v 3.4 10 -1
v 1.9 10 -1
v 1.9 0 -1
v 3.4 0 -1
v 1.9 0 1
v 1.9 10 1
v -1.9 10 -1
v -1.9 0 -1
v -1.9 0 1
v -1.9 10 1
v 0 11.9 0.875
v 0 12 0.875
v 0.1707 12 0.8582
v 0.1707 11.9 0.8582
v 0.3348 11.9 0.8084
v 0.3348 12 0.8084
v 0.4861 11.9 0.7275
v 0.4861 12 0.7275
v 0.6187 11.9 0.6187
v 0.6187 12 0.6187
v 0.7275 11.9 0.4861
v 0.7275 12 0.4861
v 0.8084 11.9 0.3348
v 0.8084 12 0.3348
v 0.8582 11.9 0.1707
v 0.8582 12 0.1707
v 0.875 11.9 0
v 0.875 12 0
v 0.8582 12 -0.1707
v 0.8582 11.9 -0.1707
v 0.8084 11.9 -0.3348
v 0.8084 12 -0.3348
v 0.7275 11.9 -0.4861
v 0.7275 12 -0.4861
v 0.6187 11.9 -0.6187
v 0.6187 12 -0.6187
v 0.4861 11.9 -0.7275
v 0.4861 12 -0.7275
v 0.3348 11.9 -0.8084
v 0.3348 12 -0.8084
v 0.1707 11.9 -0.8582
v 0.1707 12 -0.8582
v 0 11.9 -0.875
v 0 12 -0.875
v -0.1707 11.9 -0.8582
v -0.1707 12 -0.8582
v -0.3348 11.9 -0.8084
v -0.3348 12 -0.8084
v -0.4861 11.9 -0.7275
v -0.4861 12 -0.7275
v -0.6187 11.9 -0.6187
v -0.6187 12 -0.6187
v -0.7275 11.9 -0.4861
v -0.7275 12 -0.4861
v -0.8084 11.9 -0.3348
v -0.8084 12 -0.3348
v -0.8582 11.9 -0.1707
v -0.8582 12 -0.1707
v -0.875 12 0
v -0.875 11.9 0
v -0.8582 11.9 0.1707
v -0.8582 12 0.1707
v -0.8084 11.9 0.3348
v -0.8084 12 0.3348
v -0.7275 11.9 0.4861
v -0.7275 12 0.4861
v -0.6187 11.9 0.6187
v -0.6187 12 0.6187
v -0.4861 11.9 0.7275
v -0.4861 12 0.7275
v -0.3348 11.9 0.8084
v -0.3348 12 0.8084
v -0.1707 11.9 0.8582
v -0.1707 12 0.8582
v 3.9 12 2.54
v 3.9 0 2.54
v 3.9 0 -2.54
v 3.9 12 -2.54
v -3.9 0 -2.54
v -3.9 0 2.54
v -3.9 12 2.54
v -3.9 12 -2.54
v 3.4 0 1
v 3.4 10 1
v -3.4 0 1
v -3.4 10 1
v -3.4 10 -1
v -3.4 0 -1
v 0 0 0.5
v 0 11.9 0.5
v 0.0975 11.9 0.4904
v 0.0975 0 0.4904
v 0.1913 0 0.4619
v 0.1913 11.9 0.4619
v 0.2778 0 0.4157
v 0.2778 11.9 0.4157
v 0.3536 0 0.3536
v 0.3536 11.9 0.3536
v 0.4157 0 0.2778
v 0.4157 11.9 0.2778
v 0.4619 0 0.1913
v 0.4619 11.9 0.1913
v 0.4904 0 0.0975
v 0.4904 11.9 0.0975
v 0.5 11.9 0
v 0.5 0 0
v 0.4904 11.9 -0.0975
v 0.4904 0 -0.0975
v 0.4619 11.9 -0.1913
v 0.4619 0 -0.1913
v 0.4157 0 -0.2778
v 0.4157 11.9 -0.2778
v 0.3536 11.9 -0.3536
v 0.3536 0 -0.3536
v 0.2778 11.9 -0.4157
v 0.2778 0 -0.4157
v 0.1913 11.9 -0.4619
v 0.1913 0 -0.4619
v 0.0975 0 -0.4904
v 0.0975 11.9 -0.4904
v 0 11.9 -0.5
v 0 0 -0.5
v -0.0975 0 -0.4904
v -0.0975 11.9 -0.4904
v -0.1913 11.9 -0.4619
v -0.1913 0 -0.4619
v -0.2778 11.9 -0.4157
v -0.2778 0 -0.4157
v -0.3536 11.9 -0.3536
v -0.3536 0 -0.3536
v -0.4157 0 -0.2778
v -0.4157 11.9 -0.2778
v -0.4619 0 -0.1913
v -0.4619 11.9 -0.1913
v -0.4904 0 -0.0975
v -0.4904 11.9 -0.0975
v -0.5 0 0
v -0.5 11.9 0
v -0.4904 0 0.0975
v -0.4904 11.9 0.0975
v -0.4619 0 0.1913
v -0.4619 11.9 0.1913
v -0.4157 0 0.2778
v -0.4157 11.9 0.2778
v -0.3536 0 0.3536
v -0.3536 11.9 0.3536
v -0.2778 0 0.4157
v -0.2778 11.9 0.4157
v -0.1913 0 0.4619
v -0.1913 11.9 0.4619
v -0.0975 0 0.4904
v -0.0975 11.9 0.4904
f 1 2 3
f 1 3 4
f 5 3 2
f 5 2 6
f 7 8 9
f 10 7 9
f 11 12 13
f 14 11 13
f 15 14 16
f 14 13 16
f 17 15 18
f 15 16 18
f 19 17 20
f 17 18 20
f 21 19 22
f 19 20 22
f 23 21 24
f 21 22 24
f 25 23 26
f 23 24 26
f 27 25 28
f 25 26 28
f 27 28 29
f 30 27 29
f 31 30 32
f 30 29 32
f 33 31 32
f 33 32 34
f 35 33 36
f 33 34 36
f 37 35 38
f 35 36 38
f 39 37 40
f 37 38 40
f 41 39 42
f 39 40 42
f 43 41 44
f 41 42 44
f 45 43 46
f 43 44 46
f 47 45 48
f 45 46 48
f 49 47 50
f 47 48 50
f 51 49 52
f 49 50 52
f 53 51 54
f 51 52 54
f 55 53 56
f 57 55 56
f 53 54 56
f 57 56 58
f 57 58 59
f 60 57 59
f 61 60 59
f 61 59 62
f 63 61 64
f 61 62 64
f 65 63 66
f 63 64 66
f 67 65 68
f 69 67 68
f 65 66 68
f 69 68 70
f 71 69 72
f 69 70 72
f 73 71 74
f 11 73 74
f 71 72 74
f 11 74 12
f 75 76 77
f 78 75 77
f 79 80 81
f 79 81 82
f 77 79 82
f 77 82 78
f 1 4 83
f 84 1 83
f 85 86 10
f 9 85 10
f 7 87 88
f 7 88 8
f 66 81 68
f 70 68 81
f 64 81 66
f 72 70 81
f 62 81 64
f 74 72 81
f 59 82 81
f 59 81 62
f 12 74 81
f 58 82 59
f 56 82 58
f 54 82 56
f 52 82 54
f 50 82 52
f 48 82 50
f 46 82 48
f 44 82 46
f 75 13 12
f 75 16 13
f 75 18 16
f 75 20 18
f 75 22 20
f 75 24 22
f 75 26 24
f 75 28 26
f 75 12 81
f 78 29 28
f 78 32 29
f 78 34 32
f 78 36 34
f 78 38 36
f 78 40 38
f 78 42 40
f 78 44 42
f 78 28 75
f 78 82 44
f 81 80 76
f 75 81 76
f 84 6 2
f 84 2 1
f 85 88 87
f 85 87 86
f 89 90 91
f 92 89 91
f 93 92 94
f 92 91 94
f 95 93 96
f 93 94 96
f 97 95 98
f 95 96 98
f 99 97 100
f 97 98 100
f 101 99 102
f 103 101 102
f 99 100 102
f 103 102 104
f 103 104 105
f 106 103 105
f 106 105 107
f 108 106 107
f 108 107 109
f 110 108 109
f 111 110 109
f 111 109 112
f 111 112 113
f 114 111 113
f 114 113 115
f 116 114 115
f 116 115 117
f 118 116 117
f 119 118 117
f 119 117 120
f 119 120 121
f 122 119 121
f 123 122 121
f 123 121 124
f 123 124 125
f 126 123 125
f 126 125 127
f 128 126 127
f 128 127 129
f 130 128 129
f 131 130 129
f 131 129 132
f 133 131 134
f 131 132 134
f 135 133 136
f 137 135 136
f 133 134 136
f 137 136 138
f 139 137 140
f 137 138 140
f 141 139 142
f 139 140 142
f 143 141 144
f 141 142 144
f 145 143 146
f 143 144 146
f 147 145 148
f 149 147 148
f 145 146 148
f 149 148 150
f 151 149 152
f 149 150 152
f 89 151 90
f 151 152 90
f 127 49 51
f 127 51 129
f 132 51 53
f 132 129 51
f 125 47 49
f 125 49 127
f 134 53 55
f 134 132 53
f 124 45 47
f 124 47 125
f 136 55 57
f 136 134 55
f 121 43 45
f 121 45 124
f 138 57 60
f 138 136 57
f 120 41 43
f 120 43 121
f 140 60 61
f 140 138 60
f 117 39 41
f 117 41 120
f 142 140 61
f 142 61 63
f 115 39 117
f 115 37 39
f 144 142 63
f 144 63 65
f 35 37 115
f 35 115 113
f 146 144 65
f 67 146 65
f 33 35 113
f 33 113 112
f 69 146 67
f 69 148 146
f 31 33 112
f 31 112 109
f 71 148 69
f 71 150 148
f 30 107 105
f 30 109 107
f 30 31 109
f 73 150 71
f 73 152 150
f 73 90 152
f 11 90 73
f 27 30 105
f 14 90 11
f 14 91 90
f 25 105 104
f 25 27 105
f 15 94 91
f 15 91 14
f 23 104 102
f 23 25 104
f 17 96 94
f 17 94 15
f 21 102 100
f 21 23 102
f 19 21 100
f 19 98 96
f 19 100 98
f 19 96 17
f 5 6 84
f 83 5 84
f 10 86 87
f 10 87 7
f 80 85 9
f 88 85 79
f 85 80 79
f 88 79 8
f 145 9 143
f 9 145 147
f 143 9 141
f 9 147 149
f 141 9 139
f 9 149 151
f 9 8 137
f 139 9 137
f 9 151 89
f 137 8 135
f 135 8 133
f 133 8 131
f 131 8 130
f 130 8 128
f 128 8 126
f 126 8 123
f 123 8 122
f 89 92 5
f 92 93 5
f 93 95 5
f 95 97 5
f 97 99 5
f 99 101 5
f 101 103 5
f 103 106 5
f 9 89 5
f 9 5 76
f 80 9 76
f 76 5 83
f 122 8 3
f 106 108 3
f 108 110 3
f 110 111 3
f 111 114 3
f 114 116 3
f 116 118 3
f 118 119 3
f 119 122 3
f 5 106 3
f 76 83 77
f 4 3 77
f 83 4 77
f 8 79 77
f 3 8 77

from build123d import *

# Parameters (mm, degrees)
SKETCH_1_W          = 7.8
SKETCH_1_H          = 5.08
EXTRUDE_1_DEPTH     = 12
SKETCH_2_R          = 0.5
CUT_EXTRUDE_1_DEPTH = 12
SKETCH_3_R          = 0.875
CUT_EXTRUDE_2_DEPTH = 0.1
CUT_EXTRUDE_START   = -10
SKETCH_4_W          = 1.5
SKETCH_4_H          = 2
CUT_EXTRUDE_3_DEPTH = 10


with BuildPart() as part:
    # 草图1 → 拉伸1 (new body)
    with BuildSketch(Plane(origin=(0, 0, 0), x_dir=(1, 0, 0), z_dir=(0, 1, 0))):
        Rectangle(SKETCH_1_W, SKETCH_1_H)
    extrude(amount=EXTRUDE_1_DEPTH)

    # 草图2 → 切除-拉伸1 (cut)
    with BuildSketch(Plane(origin=(0, 12, 0), x_dir=(1, 0, 0), z_dir=(0, 1, 0))):
        with Locations(Location((0, 0, 0), (0, 0, 270))):
            Circle(SKETCH_2_R)
    extrude(amount=-CUT_EXTRUDE_1_DEPTH, mode=Mode.SUBTRACT)

    # 草图3 → 切除-拉伸2 (cut)
    with BuildSketch(Plane(origin=(0, 12, 0), x_dir=(1, 0, 0), z_dir=(0, 1, 0))):
        with Locations(Location((0, 0, 0), (0, 0, 270))):
            Circle(SKETCH_3_R)
    extrude(amount=-CUT_EXTRUDE_2_DEPTH, mode=Mode.SUBTRACT)

    # 草图4 → 切除-拉伸3 (cut)
    with BuildSketch(Plane.XZ.offset(CUT_EXTRUDE_START)):
        with Locations((-2.65, 0)):
            Rectangle(SKETCH_4_W, SKETCH_4_H)
        with Locations((2.65, 0)):
            Rectangle(SKETCH_4_W, SKETCH_4_H)
    extrude(amount=CUT_EXTRUDE_3_DEPTH, mode=Mode.SUBTRACT)


solid = part.part
